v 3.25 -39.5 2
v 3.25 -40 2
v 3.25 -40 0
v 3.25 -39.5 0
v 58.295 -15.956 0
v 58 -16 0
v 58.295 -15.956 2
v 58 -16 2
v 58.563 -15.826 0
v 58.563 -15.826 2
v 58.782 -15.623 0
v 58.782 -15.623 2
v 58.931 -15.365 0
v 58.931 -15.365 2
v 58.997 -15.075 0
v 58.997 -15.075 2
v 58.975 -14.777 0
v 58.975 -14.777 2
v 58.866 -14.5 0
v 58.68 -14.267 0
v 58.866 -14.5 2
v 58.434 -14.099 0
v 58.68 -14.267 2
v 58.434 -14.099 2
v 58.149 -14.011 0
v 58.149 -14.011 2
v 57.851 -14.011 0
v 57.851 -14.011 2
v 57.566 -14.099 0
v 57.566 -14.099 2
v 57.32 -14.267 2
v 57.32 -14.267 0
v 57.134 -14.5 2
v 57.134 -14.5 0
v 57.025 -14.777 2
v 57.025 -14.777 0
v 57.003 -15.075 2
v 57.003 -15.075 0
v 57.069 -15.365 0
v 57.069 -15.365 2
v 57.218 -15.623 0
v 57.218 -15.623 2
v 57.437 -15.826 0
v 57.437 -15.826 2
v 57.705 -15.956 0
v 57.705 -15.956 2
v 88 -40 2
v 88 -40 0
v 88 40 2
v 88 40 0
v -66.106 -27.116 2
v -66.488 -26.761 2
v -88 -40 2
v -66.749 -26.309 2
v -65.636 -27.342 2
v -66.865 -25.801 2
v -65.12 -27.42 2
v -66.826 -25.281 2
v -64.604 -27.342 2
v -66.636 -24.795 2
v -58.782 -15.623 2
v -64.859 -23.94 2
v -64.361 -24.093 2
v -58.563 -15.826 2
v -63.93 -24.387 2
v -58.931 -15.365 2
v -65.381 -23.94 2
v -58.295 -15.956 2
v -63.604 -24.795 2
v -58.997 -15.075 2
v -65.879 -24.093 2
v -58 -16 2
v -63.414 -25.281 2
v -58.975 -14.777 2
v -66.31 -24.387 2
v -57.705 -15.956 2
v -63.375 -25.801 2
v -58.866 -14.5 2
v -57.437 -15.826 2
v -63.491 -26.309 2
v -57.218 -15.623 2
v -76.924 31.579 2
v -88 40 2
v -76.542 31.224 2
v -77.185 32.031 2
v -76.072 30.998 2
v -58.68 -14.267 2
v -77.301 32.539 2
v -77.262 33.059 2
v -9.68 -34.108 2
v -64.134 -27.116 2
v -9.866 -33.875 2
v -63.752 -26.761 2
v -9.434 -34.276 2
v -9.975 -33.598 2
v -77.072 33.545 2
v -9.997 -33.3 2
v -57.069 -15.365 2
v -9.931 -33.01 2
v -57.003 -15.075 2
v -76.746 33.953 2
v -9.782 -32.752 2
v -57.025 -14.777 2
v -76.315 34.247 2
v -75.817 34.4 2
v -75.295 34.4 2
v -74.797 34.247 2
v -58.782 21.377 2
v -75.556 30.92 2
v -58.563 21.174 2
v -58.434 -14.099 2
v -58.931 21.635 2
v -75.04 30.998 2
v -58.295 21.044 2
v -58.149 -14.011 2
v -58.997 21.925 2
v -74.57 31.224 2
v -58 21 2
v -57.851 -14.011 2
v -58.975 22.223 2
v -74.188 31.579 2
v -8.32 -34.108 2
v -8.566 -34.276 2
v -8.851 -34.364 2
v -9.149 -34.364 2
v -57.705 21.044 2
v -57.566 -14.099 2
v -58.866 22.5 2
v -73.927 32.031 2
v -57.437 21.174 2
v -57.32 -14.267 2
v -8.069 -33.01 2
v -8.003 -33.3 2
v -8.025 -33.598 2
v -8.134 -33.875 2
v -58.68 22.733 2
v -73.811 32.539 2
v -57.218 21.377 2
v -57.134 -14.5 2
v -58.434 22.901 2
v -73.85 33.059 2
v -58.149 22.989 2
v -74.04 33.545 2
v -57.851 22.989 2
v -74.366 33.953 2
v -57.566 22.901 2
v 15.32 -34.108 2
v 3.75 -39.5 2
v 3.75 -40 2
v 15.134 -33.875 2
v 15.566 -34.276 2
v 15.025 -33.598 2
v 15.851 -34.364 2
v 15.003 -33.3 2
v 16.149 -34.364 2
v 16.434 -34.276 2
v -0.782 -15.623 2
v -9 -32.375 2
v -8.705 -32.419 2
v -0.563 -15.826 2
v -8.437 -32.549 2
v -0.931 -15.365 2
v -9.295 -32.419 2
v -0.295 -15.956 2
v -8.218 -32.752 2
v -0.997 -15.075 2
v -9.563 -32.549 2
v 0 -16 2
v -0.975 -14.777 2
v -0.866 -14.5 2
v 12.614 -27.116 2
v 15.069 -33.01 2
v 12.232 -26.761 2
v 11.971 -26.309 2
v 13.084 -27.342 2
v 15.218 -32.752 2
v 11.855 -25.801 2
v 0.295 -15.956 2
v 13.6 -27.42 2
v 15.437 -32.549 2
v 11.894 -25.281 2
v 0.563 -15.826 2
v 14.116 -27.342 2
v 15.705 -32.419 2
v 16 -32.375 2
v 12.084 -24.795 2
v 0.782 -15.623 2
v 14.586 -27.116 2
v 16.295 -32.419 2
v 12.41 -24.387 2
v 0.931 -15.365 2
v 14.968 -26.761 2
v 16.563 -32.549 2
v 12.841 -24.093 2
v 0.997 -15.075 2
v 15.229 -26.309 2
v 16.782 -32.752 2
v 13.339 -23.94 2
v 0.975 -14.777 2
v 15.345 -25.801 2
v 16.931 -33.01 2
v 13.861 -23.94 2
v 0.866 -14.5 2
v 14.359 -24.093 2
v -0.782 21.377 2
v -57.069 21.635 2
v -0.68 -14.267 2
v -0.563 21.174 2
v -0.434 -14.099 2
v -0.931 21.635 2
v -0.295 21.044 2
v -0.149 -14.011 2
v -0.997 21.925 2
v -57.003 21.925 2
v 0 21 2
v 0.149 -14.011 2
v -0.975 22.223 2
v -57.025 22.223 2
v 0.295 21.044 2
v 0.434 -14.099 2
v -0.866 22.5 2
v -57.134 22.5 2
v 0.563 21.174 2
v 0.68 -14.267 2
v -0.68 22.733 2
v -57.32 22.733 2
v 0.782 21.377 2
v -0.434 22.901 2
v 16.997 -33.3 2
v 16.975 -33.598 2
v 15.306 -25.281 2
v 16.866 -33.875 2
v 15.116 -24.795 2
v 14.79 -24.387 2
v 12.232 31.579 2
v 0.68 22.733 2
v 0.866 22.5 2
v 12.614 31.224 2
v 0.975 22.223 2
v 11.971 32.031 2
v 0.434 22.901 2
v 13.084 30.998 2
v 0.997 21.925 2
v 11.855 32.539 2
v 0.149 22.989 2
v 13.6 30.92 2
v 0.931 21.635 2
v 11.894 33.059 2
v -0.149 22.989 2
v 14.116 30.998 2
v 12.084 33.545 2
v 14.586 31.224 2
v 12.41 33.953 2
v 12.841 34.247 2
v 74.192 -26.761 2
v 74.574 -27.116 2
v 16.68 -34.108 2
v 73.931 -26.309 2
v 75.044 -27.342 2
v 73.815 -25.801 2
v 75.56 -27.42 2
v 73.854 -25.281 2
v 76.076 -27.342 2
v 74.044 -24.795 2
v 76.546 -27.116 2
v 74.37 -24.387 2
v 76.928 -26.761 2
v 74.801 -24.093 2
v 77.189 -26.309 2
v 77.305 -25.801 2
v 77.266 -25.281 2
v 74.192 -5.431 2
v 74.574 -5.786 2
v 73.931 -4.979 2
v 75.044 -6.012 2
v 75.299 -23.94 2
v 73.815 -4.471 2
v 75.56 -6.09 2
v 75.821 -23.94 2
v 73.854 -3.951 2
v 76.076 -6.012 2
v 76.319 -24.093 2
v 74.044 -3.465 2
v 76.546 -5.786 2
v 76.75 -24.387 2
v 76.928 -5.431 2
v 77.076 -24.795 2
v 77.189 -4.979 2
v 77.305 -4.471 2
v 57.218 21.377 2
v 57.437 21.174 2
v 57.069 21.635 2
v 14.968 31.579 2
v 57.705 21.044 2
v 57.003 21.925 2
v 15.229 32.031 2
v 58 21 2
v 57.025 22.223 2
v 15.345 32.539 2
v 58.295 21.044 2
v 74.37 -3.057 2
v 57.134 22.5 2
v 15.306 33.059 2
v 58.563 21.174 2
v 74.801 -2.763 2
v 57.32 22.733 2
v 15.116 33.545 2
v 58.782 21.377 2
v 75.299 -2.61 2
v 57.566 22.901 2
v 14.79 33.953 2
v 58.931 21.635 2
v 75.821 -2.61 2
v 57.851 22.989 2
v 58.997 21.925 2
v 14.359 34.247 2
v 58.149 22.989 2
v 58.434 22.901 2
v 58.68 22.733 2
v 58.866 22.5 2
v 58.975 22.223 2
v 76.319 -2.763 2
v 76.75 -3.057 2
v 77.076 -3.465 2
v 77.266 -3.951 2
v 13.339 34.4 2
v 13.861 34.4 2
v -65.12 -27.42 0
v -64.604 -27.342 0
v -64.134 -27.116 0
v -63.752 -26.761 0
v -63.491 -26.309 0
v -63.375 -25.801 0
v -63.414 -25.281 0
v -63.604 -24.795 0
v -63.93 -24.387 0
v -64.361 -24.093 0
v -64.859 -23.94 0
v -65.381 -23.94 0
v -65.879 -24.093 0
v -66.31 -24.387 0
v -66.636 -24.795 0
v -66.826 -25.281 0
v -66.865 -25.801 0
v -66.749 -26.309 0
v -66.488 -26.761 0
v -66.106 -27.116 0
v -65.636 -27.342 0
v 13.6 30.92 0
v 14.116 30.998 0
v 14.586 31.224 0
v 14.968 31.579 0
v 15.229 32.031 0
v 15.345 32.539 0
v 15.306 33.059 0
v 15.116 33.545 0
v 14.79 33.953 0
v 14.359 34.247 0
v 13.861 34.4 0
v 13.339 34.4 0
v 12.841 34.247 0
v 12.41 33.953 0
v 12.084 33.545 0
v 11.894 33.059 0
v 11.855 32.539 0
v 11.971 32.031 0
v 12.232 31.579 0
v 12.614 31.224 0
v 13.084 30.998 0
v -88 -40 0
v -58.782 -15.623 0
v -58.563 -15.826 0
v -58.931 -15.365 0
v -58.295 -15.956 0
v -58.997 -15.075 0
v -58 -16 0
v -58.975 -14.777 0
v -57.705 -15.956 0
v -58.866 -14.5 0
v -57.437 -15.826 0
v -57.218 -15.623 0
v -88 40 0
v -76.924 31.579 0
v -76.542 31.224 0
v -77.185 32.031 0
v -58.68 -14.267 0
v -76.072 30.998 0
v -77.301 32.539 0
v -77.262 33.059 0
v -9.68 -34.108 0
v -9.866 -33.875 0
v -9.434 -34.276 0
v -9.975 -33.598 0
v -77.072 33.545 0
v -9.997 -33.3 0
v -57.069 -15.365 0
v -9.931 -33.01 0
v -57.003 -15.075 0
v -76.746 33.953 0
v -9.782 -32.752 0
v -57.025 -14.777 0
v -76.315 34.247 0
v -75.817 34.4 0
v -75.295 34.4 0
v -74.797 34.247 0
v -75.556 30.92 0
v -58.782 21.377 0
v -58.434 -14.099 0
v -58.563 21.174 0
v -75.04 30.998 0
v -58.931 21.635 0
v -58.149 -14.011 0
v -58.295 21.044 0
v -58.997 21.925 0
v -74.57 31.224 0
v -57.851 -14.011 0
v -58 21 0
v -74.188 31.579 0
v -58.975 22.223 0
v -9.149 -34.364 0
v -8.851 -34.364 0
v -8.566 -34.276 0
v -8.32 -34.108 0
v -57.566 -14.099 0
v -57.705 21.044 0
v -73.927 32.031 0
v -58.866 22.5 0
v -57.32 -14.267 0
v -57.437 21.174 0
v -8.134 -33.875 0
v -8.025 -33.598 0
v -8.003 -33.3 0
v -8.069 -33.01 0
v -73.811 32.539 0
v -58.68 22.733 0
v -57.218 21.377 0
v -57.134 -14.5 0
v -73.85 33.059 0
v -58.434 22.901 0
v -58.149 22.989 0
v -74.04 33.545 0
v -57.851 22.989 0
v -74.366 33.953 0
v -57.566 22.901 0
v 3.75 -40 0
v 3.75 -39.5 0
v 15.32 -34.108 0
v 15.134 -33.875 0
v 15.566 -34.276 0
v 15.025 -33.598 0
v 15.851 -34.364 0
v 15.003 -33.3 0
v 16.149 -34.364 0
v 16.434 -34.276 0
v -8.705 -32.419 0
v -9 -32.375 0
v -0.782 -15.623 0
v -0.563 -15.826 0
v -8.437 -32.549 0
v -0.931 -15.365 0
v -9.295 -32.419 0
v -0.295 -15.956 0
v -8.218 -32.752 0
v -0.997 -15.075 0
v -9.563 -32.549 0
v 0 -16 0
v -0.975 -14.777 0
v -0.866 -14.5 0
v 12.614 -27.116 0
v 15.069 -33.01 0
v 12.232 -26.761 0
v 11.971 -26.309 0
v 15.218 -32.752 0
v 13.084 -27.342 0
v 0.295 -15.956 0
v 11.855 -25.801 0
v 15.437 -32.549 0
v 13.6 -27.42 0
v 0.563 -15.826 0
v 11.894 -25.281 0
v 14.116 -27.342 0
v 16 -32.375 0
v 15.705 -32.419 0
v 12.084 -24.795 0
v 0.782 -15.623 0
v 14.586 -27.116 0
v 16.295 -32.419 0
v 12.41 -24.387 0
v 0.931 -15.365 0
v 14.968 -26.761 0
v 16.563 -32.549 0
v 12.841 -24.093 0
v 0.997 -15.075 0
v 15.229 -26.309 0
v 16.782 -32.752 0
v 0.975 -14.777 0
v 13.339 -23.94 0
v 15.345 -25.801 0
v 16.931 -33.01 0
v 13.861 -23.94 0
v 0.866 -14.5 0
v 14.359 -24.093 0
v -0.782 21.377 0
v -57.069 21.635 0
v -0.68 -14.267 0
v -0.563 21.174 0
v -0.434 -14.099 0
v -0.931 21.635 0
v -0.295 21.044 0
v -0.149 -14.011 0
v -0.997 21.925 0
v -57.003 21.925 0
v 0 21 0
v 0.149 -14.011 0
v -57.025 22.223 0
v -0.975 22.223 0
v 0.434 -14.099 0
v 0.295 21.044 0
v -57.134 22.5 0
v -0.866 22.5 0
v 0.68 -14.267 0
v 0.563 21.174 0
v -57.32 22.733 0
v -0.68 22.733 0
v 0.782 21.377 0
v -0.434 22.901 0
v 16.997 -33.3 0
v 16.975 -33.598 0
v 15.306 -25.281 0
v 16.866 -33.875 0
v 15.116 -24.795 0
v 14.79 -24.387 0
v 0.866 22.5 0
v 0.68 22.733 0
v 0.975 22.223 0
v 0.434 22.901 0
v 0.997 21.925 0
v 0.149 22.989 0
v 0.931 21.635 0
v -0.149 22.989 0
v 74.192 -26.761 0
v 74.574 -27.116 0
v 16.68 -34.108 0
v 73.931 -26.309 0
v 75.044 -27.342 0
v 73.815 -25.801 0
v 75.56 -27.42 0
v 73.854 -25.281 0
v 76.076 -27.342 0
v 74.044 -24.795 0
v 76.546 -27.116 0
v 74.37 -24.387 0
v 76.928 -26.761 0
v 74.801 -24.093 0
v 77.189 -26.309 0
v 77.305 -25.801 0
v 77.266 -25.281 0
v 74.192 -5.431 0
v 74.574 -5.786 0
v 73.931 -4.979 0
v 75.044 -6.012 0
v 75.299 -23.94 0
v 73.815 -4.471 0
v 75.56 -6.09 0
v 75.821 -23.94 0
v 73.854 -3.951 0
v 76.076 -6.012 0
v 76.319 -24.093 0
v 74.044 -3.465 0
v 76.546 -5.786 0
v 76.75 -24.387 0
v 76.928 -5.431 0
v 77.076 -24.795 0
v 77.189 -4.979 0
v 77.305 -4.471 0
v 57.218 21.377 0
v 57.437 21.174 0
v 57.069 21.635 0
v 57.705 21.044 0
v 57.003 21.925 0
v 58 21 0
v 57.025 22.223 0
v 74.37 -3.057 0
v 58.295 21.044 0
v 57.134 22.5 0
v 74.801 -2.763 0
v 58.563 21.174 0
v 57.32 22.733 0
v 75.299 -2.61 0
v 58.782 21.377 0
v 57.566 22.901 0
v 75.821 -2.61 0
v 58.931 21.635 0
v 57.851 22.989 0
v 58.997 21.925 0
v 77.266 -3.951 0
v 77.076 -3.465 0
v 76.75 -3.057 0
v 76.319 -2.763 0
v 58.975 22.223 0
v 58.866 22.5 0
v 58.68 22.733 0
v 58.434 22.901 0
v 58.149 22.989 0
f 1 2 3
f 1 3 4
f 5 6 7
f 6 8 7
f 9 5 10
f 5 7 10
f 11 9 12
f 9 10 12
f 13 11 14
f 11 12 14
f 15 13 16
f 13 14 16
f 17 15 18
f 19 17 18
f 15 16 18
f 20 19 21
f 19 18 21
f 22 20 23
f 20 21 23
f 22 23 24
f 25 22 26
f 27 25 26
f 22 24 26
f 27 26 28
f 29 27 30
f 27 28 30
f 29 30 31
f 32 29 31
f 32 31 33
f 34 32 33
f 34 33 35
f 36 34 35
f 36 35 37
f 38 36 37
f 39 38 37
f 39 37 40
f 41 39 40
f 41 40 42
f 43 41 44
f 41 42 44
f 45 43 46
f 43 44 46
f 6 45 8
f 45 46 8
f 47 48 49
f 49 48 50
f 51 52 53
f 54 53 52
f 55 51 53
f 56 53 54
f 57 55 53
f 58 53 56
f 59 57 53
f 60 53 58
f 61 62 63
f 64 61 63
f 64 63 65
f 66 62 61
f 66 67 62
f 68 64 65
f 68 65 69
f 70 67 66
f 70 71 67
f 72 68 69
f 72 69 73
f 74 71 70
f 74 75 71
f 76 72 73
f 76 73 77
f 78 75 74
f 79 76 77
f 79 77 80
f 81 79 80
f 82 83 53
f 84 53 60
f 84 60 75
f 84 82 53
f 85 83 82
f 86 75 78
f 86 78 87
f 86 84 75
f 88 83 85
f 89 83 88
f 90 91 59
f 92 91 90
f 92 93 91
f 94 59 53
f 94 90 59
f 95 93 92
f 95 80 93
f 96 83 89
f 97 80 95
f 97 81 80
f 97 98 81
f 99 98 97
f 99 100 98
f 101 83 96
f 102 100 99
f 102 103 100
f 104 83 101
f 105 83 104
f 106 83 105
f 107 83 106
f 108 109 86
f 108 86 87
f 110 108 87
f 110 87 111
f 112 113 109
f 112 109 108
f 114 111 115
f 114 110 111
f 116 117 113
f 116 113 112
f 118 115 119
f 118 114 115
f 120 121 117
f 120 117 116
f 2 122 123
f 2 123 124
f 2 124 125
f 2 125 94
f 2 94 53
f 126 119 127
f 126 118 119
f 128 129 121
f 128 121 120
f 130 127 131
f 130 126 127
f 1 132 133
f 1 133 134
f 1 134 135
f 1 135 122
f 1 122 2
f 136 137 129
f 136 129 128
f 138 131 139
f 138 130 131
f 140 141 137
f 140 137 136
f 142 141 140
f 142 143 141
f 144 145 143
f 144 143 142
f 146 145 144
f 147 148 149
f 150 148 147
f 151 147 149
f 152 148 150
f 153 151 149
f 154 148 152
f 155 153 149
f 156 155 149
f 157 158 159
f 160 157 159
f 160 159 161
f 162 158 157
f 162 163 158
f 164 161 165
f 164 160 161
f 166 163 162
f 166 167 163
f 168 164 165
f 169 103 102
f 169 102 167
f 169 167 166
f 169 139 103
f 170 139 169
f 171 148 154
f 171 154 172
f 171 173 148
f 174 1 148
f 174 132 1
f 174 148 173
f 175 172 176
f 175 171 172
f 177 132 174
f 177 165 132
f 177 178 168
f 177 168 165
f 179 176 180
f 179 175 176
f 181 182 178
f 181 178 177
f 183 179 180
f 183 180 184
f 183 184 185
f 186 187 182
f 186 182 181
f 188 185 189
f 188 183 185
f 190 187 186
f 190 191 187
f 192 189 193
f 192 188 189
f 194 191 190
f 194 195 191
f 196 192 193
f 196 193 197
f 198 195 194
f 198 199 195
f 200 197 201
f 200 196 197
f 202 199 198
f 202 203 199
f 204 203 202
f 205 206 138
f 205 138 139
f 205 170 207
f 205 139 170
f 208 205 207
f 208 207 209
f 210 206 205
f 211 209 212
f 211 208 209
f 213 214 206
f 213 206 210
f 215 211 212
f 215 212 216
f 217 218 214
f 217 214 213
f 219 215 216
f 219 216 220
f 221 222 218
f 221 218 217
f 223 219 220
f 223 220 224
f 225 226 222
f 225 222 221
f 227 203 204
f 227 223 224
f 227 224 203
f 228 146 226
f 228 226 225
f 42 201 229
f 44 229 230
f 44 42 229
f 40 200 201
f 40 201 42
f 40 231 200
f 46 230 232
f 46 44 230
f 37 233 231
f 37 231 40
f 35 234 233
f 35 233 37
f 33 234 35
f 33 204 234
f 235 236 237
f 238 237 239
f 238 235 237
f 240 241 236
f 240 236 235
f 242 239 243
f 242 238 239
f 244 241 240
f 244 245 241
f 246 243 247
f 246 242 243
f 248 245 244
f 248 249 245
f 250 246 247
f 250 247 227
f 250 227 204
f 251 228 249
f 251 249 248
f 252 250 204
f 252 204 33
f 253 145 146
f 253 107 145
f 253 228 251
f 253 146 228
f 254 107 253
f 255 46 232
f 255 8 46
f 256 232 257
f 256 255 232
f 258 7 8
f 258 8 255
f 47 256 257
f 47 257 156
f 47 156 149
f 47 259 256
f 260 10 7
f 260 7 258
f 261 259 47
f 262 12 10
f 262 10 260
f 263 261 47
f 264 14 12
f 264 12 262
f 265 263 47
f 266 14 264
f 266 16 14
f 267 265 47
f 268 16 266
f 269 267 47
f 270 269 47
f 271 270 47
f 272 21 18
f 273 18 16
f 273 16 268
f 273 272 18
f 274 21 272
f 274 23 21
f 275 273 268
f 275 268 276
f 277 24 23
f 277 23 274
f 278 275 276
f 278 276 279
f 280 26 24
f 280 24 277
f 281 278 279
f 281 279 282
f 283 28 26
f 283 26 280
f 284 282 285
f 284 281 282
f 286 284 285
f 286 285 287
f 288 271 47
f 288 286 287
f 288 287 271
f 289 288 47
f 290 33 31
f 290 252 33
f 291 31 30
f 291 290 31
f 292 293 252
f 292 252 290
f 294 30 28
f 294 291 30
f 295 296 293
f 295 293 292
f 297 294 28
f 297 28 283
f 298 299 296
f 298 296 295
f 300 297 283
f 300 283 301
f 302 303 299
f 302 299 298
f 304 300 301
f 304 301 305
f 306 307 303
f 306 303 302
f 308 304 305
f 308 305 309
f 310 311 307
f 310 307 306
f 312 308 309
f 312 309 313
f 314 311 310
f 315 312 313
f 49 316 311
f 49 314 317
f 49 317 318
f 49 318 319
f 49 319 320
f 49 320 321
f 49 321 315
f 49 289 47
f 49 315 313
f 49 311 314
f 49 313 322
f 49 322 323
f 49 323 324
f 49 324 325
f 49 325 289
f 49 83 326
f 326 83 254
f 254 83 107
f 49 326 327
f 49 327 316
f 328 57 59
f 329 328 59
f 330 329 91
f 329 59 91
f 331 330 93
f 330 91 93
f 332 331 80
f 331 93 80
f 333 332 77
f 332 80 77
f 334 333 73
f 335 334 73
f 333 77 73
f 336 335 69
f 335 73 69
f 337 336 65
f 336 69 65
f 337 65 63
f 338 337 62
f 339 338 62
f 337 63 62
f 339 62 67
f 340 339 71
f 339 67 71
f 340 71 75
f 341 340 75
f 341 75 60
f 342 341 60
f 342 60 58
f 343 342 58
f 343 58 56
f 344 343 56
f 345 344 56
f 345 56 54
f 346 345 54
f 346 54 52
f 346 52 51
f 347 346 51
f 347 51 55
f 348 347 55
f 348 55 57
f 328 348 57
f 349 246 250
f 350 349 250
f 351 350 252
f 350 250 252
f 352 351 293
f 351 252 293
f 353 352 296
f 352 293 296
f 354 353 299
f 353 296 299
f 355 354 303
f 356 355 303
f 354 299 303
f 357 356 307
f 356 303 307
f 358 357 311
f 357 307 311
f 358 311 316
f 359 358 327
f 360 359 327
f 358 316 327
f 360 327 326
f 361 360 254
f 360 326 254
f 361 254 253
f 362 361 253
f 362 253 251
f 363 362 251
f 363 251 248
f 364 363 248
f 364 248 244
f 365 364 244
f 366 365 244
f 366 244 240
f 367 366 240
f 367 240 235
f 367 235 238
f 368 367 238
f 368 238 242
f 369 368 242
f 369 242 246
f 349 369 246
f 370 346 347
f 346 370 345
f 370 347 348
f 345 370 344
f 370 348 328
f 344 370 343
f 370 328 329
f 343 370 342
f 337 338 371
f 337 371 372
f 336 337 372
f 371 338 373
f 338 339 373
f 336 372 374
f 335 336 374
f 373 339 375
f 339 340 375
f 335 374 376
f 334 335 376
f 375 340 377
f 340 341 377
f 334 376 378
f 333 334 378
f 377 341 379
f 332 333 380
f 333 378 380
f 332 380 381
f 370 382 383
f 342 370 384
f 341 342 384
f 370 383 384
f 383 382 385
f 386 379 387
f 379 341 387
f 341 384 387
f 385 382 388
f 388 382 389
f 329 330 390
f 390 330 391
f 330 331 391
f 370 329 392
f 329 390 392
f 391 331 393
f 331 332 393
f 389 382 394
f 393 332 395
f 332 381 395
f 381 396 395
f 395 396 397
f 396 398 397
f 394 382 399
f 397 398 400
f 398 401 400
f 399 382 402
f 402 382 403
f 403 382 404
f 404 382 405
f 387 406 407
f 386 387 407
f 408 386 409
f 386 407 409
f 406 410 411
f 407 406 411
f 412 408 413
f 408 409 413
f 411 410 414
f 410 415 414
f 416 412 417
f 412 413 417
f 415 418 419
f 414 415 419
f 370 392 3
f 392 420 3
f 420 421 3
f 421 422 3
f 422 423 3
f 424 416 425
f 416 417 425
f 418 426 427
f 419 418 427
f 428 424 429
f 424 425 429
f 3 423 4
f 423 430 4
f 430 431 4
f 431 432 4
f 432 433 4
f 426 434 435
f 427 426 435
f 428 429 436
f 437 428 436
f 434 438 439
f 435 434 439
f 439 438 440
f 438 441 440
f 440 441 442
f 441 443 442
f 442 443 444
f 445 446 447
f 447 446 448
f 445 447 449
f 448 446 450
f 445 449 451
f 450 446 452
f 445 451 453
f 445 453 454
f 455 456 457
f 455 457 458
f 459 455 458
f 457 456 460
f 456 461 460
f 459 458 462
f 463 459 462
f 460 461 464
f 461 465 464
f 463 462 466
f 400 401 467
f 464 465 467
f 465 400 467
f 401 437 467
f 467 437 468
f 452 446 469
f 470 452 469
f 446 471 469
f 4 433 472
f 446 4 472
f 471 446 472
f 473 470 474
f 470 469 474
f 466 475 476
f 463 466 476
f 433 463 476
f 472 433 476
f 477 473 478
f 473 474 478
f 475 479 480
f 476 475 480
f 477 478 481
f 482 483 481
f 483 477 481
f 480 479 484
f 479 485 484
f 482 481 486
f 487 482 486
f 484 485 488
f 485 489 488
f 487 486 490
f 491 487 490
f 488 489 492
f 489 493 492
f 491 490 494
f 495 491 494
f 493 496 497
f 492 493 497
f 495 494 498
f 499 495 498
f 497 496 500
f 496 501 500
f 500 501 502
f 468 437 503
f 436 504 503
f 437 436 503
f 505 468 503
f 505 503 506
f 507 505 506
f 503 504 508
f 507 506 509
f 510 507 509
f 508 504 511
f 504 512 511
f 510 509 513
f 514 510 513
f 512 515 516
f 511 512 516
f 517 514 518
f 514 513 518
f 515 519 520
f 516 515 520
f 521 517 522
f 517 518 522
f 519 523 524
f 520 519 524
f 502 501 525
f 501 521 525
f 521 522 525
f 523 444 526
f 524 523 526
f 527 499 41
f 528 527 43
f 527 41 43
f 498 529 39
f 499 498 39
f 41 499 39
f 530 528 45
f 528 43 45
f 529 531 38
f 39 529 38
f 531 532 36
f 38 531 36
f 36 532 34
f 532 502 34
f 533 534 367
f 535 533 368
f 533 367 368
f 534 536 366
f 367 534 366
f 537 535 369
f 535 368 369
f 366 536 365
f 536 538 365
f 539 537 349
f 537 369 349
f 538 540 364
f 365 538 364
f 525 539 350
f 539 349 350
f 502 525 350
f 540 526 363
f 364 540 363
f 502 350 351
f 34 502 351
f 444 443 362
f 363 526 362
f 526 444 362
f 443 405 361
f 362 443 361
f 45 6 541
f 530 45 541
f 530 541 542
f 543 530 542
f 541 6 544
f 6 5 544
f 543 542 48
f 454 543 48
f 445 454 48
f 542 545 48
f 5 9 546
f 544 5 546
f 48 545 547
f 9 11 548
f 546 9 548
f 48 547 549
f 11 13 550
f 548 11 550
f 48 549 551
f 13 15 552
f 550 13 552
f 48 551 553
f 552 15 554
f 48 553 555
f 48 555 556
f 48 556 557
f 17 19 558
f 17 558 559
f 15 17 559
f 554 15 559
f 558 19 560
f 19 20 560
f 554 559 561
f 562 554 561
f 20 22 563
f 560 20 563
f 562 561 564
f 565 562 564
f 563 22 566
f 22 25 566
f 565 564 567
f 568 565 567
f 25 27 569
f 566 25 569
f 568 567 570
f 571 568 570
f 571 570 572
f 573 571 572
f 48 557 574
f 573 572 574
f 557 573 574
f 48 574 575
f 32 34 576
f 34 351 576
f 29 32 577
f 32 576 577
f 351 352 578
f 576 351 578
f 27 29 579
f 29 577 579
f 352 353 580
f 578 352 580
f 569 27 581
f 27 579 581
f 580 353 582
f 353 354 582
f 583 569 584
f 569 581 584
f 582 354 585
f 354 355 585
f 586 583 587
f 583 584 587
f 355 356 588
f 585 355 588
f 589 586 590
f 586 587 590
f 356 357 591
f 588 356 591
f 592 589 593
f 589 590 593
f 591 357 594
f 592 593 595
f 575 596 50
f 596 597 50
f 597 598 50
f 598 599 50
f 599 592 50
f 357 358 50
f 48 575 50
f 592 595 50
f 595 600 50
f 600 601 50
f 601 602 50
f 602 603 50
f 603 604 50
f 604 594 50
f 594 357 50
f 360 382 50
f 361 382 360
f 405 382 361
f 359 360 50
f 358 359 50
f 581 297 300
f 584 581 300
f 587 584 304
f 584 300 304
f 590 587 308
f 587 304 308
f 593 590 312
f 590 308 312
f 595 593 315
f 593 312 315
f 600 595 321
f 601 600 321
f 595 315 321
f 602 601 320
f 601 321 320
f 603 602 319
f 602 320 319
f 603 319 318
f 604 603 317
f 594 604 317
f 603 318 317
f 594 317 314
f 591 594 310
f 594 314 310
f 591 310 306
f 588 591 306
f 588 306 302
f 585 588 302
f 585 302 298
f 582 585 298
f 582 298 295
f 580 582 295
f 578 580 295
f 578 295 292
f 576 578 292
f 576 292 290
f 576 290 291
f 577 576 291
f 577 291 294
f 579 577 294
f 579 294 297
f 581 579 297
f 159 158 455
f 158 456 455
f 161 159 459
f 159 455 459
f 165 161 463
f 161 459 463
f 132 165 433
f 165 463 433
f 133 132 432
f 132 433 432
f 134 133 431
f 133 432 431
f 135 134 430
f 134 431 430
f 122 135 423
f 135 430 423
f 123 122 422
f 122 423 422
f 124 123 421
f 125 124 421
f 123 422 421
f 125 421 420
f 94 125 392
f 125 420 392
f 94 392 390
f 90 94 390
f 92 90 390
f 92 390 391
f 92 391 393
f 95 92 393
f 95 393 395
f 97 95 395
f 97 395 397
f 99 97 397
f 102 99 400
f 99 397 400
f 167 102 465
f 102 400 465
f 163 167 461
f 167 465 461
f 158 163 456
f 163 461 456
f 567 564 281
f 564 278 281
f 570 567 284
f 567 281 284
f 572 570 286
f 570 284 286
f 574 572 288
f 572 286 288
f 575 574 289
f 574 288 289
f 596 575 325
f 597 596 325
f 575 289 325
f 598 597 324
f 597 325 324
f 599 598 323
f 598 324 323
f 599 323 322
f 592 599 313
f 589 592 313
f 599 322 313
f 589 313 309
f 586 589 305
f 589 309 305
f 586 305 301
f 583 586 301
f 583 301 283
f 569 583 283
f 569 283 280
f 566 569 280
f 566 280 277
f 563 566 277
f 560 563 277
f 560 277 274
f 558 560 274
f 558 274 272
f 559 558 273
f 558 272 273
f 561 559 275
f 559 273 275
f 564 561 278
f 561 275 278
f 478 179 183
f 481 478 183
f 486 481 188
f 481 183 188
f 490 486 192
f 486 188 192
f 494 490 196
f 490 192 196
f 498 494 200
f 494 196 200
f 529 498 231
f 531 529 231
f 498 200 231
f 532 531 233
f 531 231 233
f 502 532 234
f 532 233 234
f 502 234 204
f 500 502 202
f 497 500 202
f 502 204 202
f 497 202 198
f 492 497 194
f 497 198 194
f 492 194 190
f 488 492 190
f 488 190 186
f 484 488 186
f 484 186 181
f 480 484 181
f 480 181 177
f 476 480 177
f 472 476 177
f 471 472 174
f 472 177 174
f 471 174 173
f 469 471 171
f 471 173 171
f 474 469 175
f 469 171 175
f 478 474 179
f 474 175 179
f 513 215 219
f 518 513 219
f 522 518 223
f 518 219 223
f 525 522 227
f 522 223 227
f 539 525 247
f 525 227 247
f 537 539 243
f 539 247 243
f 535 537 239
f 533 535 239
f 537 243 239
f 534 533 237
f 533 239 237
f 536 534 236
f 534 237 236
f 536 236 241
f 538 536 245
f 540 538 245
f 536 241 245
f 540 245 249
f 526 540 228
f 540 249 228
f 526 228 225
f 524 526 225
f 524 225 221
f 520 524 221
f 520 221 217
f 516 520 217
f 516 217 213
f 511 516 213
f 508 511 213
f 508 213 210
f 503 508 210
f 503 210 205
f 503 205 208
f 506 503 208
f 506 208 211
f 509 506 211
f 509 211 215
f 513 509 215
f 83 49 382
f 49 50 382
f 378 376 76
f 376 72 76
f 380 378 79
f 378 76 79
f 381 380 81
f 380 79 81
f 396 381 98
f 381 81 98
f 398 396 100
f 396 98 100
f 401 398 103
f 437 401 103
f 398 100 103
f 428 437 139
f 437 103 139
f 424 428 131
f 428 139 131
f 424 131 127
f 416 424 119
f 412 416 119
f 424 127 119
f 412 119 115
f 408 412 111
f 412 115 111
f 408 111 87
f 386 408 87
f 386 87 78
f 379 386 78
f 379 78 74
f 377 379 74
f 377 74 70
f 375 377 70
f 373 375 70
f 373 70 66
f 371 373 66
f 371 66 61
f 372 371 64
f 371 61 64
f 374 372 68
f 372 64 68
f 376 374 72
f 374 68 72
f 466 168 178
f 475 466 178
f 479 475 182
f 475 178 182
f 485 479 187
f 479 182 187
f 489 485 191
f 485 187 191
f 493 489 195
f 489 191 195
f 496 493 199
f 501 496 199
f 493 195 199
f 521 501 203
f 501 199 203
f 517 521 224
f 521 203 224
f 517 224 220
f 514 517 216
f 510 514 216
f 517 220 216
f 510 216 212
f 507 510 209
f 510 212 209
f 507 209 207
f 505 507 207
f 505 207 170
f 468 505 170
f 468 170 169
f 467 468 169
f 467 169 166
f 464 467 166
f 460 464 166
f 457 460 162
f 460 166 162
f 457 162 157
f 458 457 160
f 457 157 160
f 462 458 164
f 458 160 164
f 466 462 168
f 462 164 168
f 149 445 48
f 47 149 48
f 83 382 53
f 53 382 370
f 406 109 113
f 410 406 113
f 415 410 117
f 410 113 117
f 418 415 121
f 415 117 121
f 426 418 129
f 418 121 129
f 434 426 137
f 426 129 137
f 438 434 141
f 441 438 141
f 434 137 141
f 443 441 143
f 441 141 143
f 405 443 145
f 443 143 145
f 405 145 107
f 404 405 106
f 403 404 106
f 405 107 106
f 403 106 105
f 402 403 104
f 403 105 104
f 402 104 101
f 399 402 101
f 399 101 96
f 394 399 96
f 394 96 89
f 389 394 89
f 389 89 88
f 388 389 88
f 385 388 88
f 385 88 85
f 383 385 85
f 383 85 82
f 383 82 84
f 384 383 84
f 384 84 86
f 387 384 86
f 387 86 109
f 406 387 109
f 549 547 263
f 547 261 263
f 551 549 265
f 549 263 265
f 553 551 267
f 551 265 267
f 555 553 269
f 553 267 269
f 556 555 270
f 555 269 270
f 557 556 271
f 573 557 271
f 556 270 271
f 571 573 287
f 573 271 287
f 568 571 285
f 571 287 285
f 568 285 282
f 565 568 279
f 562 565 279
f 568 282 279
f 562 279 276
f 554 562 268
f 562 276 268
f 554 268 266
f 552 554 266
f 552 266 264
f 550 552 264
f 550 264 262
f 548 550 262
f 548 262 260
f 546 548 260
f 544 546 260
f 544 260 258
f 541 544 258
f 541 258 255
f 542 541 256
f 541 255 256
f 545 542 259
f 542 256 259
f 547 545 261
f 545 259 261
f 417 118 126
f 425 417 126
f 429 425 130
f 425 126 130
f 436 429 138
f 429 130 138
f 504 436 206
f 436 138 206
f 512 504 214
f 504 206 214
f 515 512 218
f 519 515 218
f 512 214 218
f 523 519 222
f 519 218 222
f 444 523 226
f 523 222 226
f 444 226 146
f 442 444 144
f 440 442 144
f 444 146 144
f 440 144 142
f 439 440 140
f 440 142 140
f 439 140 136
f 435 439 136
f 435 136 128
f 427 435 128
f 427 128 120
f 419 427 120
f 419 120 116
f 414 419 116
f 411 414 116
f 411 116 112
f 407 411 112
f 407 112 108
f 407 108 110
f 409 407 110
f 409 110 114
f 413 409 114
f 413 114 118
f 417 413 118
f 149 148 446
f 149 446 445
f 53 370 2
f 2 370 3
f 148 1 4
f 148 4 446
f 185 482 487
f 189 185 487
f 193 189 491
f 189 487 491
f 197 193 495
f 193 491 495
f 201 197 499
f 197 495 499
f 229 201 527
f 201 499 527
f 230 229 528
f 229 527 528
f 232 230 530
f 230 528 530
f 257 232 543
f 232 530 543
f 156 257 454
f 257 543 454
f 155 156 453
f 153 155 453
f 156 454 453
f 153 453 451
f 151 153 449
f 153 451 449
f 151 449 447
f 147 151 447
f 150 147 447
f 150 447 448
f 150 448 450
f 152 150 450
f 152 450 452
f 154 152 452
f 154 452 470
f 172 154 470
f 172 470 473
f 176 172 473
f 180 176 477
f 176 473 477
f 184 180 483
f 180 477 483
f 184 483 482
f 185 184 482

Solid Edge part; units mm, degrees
sketch "Sketch1" plane through (0, 0, 0) normal (0, 0, 1) x (1, 0, 0)
  line L0 (-88, -40) -> (88, -40)
  line L1 (88, -40) -> (88, 40)
  line L2 (88, 40) -> (-88, 40)
  line L3 (-88, 40) -> (-88, -40)
  dimension "D1" = 80
  dimension "D2" = 176
extrude "Protrusion1" add sketch "Sketch1" along normal blind 2
hole "Hole1" at (-9, -33.375, 0) direction (0, 0, 1) diameter 2 end up to next
hole "Hole2" at (16, -33.375, 0) direction (0, 0, 1) diameter 2 end up to next
hole "Hole3" at (0, 22, 2) direction (0, 0, -1) diameter 2 end through all
hole "Hole4" at (58, 22, 2) direction (0, 0, -1) diameter 2 end through all
hole "Hole5" at (58, -15, 2) direction (0, 0, -1) diameter 2 end through all
hole "Hole6" at (0, -15, 2) direction (0, 0, -1) diameter 2 end through all
hole "Hole7" at (-58, -15, 2) direction (0, 0, -1) diameter 2 end through all
hole "Hole8" at (-58, 22, 2) direction (0, 0, -1) diameter 2 end through all
sketch "Sketch2" plane through (0, 0, 2) normal (0, 0, 1) x (1, 0, 0)
  line L0 (3.25, -40) -> (3.75, -40)
  line L1 (3.75, -39.5) -> (3.75, -40)
  line L2 (3.25, -39.5) -> (3.75, -39.5)
  line L3 (3.25, -40) -> (3.25, -39.5)
  dimension "D1" = 0.5
extrude "Cutout1" cut sketch "Sketch2" against normal through all
hole "Hole9" at (-75.556, 32.67, 2) direction (0, 0, -1) diameter 3.5 end through all
hole "Hole10" at (75.56, -25.67, 2) direction (0, 0, -1) diameter 3.5 end through all
hole "Hole11" at (13.6, 32.67, 2) direction (0, 0, -1) diameter 3.5 end through all
hole "Hole12" at (-65.12, -25.67, 2) direction (0, 0, -1) diameter 3.5 end through all
hole "Hole13" at (13.6, -25.67, 2) direction (0, 0, -1) diameter 3.5 end through all
hole "Hole14" at (75.56, -4.34, 2) direction (0, 0, -1) diameter 3.5 end through all
